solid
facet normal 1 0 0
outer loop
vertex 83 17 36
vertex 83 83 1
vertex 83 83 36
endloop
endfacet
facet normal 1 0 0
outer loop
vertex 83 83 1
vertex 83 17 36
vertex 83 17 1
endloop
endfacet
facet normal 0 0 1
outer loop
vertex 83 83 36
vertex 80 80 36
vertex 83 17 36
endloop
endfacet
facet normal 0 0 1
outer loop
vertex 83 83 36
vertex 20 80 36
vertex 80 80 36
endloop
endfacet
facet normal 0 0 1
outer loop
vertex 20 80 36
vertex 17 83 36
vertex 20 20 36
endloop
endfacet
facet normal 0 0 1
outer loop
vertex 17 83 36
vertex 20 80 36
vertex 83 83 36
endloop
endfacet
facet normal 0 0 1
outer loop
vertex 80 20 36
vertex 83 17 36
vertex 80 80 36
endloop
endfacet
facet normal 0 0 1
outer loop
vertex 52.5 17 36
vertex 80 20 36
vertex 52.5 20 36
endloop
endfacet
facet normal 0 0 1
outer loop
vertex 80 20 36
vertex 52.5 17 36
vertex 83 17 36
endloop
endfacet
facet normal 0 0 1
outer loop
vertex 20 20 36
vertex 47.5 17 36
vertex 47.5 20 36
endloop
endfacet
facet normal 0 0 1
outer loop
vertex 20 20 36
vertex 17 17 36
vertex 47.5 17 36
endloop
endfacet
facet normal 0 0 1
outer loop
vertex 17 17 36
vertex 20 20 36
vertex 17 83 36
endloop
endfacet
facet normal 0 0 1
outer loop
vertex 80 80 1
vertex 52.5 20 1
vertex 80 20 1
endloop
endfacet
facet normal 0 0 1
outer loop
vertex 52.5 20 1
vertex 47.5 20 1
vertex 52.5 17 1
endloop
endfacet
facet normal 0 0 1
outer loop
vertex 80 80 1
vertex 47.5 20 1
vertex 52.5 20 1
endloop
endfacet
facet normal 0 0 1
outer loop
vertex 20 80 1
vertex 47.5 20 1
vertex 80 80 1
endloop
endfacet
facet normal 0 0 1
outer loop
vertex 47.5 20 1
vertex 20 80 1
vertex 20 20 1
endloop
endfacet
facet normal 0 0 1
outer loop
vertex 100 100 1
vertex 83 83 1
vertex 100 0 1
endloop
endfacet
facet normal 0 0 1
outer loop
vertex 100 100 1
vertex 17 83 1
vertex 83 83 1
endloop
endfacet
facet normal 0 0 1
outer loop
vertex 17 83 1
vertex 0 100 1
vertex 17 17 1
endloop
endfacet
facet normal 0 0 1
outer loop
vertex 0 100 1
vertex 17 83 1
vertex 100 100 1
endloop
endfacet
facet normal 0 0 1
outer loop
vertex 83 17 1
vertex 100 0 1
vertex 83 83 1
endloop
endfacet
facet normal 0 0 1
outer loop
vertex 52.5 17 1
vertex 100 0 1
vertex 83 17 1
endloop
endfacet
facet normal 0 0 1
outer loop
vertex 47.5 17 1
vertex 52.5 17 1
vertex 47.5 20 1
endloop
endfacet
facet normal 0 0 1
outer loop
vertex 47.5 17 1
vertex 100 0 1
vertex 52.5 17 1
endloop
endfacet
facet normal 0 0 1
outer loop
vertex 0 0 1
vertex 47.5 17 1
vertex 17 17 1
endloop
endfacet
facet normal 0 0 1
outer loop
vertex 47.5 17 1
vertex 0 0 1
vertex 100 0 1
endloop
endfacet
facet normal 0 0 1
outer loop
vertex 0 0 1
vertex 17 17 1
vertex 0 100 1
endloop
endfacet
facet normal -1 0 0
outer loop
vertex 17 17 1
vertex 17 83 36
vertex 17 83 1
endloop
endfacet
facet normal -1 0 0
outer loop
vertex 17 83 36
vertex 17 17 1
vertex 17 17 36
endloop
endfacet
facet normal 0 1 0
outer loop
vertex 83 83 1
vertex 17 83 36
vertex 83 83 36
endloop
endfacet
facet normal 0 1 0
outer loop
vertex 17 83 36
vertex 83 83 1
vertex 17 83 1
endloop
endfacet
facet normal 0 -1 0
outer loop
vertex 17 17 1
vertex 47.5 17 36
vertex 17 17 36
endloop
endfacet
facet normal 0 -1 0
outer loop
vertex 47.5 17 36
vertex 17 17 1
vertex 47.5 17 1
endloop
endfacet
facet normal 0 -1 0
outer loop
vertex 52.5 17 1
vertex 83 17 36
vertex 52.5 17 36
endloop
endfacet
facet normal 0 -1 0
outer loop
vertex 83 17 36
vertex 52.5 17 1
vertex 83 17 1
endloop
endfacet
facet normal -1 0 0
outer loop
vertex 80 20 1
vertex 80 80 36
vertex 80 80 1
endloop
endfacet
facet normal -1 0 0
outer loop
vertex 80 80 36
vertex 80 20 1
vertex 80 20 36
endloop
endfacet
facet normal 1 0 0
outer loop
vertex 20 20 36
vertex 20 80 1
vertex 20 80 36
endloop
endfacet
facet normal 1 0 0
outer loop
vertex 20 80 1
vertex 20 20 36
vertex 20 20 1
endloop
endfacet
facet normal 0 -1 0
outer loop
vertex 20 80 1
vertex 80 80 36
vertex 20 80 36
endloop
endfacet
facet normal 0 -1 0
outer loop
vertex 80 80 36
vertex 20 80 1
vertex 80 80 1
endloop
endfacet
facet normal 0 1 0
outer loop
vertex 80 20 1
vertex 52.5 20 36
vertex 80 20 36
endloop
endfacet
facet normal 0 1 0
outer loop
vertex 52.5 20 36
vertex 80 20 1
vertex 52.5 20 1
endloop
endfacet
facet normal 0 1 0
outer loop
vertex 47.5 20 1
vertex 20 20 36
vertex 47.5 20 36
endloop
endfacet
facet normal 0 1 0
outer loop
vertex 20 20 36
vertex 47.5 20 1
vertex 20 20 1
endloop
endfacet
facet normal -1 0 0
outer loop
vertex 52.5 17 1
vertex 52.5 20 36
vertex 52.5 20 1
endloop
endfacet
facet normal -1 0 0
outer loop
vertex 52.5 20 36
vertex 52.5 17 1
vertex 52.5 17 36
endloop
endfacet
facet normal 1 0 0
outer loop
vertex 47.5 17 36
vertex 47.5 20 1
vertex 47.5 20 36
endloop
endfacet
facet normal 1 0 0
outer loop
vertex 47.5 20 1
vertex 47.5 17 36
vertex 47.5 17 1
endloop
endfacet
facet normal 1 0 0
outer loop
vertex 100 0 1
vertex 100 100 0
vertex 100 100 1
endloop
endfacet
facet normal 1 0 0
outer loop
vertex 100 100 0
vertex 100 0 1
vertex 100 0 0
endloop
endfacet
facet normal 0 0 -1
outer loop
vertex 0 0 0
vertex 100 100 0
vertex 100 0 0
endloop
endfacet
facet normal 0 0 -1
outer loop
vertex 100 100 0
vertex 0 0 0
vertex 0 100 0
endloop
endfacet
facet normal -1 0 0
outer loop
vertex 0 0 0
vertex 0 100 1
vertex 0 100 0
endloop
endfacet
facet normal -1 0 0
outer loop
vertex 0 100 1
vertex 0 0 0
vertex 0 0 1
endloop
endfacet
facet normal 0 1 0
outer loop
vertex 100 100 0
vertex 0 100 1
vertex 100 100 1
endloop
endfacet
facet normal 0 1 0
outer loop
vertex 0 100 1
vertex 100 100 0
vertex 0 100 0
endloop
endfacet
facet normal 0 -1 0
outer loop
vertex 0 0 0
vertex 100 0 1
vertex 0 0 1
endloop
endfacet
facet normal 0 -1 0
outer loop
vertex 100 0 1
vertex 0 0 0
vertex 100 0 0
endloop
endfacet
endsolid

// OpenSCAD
color([0.5,0.5,0.5]) {
  base    = 100;
  cube([base,base,1]);
  real_wd = 56;
  mal_wd  = real_wd + 10;
  mal_h   = 35;
  fem_wd  = real_wd+4;
  fem_h   = real_wd+4;
  translate([base/2,base/2,1]) {
    difference() {
      translate([-mal_wd/2, -mal_wd/2, 0]) {
        cube([mal_wd,mal_wd,mal_h]);
      }
      translate([-fem_wd/2, -fem_wd/2, 0]) {
        cube([fem_wd,fem_wd,fem_h+0.001]);
      }
      translate([-5/2,-fem_wd/2-10/2,0]) cube([5,10,fem_h+0.001]);
    }
  }
}
